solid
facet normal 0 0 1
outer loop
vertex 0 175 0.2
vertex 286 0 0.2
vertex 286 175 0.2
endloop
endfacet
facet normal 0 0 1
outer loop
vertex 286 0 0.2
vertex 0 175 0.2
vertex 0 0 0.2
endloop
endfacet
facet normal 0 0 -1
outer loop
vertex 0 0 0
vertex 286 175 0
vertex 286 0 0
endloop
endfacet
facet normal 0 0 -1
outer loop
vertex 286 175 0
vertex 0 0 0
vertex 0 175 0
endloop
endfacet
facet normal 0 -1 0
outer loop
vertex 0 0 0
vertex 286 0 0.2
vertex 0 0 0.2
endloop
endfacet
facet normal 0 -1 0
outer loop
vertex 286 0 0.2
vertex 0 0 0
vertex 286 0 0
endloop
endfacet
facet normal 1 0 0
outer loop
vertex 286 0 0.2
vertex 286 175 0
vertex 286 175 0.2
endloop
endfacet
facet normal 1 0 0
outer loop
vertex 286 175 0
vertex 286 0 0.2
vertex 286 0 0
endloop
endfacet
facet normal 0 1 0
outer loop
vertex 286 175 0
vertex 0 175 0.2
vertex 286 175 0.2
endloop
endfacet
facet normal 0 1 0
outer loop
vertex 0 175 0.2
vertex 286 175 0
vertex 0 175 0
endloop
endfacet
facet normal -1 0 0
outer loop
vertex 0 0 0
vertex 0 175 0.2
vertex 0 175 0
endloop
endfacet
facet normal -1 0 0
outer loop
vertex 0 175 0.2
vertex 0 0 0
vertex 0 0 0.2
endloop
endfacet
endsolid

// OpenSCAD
$fa=4; $fs=0.4;
color("#000000") translate([0.000,0.000,0.000]) cube([286.000,175.000,0.200]);
